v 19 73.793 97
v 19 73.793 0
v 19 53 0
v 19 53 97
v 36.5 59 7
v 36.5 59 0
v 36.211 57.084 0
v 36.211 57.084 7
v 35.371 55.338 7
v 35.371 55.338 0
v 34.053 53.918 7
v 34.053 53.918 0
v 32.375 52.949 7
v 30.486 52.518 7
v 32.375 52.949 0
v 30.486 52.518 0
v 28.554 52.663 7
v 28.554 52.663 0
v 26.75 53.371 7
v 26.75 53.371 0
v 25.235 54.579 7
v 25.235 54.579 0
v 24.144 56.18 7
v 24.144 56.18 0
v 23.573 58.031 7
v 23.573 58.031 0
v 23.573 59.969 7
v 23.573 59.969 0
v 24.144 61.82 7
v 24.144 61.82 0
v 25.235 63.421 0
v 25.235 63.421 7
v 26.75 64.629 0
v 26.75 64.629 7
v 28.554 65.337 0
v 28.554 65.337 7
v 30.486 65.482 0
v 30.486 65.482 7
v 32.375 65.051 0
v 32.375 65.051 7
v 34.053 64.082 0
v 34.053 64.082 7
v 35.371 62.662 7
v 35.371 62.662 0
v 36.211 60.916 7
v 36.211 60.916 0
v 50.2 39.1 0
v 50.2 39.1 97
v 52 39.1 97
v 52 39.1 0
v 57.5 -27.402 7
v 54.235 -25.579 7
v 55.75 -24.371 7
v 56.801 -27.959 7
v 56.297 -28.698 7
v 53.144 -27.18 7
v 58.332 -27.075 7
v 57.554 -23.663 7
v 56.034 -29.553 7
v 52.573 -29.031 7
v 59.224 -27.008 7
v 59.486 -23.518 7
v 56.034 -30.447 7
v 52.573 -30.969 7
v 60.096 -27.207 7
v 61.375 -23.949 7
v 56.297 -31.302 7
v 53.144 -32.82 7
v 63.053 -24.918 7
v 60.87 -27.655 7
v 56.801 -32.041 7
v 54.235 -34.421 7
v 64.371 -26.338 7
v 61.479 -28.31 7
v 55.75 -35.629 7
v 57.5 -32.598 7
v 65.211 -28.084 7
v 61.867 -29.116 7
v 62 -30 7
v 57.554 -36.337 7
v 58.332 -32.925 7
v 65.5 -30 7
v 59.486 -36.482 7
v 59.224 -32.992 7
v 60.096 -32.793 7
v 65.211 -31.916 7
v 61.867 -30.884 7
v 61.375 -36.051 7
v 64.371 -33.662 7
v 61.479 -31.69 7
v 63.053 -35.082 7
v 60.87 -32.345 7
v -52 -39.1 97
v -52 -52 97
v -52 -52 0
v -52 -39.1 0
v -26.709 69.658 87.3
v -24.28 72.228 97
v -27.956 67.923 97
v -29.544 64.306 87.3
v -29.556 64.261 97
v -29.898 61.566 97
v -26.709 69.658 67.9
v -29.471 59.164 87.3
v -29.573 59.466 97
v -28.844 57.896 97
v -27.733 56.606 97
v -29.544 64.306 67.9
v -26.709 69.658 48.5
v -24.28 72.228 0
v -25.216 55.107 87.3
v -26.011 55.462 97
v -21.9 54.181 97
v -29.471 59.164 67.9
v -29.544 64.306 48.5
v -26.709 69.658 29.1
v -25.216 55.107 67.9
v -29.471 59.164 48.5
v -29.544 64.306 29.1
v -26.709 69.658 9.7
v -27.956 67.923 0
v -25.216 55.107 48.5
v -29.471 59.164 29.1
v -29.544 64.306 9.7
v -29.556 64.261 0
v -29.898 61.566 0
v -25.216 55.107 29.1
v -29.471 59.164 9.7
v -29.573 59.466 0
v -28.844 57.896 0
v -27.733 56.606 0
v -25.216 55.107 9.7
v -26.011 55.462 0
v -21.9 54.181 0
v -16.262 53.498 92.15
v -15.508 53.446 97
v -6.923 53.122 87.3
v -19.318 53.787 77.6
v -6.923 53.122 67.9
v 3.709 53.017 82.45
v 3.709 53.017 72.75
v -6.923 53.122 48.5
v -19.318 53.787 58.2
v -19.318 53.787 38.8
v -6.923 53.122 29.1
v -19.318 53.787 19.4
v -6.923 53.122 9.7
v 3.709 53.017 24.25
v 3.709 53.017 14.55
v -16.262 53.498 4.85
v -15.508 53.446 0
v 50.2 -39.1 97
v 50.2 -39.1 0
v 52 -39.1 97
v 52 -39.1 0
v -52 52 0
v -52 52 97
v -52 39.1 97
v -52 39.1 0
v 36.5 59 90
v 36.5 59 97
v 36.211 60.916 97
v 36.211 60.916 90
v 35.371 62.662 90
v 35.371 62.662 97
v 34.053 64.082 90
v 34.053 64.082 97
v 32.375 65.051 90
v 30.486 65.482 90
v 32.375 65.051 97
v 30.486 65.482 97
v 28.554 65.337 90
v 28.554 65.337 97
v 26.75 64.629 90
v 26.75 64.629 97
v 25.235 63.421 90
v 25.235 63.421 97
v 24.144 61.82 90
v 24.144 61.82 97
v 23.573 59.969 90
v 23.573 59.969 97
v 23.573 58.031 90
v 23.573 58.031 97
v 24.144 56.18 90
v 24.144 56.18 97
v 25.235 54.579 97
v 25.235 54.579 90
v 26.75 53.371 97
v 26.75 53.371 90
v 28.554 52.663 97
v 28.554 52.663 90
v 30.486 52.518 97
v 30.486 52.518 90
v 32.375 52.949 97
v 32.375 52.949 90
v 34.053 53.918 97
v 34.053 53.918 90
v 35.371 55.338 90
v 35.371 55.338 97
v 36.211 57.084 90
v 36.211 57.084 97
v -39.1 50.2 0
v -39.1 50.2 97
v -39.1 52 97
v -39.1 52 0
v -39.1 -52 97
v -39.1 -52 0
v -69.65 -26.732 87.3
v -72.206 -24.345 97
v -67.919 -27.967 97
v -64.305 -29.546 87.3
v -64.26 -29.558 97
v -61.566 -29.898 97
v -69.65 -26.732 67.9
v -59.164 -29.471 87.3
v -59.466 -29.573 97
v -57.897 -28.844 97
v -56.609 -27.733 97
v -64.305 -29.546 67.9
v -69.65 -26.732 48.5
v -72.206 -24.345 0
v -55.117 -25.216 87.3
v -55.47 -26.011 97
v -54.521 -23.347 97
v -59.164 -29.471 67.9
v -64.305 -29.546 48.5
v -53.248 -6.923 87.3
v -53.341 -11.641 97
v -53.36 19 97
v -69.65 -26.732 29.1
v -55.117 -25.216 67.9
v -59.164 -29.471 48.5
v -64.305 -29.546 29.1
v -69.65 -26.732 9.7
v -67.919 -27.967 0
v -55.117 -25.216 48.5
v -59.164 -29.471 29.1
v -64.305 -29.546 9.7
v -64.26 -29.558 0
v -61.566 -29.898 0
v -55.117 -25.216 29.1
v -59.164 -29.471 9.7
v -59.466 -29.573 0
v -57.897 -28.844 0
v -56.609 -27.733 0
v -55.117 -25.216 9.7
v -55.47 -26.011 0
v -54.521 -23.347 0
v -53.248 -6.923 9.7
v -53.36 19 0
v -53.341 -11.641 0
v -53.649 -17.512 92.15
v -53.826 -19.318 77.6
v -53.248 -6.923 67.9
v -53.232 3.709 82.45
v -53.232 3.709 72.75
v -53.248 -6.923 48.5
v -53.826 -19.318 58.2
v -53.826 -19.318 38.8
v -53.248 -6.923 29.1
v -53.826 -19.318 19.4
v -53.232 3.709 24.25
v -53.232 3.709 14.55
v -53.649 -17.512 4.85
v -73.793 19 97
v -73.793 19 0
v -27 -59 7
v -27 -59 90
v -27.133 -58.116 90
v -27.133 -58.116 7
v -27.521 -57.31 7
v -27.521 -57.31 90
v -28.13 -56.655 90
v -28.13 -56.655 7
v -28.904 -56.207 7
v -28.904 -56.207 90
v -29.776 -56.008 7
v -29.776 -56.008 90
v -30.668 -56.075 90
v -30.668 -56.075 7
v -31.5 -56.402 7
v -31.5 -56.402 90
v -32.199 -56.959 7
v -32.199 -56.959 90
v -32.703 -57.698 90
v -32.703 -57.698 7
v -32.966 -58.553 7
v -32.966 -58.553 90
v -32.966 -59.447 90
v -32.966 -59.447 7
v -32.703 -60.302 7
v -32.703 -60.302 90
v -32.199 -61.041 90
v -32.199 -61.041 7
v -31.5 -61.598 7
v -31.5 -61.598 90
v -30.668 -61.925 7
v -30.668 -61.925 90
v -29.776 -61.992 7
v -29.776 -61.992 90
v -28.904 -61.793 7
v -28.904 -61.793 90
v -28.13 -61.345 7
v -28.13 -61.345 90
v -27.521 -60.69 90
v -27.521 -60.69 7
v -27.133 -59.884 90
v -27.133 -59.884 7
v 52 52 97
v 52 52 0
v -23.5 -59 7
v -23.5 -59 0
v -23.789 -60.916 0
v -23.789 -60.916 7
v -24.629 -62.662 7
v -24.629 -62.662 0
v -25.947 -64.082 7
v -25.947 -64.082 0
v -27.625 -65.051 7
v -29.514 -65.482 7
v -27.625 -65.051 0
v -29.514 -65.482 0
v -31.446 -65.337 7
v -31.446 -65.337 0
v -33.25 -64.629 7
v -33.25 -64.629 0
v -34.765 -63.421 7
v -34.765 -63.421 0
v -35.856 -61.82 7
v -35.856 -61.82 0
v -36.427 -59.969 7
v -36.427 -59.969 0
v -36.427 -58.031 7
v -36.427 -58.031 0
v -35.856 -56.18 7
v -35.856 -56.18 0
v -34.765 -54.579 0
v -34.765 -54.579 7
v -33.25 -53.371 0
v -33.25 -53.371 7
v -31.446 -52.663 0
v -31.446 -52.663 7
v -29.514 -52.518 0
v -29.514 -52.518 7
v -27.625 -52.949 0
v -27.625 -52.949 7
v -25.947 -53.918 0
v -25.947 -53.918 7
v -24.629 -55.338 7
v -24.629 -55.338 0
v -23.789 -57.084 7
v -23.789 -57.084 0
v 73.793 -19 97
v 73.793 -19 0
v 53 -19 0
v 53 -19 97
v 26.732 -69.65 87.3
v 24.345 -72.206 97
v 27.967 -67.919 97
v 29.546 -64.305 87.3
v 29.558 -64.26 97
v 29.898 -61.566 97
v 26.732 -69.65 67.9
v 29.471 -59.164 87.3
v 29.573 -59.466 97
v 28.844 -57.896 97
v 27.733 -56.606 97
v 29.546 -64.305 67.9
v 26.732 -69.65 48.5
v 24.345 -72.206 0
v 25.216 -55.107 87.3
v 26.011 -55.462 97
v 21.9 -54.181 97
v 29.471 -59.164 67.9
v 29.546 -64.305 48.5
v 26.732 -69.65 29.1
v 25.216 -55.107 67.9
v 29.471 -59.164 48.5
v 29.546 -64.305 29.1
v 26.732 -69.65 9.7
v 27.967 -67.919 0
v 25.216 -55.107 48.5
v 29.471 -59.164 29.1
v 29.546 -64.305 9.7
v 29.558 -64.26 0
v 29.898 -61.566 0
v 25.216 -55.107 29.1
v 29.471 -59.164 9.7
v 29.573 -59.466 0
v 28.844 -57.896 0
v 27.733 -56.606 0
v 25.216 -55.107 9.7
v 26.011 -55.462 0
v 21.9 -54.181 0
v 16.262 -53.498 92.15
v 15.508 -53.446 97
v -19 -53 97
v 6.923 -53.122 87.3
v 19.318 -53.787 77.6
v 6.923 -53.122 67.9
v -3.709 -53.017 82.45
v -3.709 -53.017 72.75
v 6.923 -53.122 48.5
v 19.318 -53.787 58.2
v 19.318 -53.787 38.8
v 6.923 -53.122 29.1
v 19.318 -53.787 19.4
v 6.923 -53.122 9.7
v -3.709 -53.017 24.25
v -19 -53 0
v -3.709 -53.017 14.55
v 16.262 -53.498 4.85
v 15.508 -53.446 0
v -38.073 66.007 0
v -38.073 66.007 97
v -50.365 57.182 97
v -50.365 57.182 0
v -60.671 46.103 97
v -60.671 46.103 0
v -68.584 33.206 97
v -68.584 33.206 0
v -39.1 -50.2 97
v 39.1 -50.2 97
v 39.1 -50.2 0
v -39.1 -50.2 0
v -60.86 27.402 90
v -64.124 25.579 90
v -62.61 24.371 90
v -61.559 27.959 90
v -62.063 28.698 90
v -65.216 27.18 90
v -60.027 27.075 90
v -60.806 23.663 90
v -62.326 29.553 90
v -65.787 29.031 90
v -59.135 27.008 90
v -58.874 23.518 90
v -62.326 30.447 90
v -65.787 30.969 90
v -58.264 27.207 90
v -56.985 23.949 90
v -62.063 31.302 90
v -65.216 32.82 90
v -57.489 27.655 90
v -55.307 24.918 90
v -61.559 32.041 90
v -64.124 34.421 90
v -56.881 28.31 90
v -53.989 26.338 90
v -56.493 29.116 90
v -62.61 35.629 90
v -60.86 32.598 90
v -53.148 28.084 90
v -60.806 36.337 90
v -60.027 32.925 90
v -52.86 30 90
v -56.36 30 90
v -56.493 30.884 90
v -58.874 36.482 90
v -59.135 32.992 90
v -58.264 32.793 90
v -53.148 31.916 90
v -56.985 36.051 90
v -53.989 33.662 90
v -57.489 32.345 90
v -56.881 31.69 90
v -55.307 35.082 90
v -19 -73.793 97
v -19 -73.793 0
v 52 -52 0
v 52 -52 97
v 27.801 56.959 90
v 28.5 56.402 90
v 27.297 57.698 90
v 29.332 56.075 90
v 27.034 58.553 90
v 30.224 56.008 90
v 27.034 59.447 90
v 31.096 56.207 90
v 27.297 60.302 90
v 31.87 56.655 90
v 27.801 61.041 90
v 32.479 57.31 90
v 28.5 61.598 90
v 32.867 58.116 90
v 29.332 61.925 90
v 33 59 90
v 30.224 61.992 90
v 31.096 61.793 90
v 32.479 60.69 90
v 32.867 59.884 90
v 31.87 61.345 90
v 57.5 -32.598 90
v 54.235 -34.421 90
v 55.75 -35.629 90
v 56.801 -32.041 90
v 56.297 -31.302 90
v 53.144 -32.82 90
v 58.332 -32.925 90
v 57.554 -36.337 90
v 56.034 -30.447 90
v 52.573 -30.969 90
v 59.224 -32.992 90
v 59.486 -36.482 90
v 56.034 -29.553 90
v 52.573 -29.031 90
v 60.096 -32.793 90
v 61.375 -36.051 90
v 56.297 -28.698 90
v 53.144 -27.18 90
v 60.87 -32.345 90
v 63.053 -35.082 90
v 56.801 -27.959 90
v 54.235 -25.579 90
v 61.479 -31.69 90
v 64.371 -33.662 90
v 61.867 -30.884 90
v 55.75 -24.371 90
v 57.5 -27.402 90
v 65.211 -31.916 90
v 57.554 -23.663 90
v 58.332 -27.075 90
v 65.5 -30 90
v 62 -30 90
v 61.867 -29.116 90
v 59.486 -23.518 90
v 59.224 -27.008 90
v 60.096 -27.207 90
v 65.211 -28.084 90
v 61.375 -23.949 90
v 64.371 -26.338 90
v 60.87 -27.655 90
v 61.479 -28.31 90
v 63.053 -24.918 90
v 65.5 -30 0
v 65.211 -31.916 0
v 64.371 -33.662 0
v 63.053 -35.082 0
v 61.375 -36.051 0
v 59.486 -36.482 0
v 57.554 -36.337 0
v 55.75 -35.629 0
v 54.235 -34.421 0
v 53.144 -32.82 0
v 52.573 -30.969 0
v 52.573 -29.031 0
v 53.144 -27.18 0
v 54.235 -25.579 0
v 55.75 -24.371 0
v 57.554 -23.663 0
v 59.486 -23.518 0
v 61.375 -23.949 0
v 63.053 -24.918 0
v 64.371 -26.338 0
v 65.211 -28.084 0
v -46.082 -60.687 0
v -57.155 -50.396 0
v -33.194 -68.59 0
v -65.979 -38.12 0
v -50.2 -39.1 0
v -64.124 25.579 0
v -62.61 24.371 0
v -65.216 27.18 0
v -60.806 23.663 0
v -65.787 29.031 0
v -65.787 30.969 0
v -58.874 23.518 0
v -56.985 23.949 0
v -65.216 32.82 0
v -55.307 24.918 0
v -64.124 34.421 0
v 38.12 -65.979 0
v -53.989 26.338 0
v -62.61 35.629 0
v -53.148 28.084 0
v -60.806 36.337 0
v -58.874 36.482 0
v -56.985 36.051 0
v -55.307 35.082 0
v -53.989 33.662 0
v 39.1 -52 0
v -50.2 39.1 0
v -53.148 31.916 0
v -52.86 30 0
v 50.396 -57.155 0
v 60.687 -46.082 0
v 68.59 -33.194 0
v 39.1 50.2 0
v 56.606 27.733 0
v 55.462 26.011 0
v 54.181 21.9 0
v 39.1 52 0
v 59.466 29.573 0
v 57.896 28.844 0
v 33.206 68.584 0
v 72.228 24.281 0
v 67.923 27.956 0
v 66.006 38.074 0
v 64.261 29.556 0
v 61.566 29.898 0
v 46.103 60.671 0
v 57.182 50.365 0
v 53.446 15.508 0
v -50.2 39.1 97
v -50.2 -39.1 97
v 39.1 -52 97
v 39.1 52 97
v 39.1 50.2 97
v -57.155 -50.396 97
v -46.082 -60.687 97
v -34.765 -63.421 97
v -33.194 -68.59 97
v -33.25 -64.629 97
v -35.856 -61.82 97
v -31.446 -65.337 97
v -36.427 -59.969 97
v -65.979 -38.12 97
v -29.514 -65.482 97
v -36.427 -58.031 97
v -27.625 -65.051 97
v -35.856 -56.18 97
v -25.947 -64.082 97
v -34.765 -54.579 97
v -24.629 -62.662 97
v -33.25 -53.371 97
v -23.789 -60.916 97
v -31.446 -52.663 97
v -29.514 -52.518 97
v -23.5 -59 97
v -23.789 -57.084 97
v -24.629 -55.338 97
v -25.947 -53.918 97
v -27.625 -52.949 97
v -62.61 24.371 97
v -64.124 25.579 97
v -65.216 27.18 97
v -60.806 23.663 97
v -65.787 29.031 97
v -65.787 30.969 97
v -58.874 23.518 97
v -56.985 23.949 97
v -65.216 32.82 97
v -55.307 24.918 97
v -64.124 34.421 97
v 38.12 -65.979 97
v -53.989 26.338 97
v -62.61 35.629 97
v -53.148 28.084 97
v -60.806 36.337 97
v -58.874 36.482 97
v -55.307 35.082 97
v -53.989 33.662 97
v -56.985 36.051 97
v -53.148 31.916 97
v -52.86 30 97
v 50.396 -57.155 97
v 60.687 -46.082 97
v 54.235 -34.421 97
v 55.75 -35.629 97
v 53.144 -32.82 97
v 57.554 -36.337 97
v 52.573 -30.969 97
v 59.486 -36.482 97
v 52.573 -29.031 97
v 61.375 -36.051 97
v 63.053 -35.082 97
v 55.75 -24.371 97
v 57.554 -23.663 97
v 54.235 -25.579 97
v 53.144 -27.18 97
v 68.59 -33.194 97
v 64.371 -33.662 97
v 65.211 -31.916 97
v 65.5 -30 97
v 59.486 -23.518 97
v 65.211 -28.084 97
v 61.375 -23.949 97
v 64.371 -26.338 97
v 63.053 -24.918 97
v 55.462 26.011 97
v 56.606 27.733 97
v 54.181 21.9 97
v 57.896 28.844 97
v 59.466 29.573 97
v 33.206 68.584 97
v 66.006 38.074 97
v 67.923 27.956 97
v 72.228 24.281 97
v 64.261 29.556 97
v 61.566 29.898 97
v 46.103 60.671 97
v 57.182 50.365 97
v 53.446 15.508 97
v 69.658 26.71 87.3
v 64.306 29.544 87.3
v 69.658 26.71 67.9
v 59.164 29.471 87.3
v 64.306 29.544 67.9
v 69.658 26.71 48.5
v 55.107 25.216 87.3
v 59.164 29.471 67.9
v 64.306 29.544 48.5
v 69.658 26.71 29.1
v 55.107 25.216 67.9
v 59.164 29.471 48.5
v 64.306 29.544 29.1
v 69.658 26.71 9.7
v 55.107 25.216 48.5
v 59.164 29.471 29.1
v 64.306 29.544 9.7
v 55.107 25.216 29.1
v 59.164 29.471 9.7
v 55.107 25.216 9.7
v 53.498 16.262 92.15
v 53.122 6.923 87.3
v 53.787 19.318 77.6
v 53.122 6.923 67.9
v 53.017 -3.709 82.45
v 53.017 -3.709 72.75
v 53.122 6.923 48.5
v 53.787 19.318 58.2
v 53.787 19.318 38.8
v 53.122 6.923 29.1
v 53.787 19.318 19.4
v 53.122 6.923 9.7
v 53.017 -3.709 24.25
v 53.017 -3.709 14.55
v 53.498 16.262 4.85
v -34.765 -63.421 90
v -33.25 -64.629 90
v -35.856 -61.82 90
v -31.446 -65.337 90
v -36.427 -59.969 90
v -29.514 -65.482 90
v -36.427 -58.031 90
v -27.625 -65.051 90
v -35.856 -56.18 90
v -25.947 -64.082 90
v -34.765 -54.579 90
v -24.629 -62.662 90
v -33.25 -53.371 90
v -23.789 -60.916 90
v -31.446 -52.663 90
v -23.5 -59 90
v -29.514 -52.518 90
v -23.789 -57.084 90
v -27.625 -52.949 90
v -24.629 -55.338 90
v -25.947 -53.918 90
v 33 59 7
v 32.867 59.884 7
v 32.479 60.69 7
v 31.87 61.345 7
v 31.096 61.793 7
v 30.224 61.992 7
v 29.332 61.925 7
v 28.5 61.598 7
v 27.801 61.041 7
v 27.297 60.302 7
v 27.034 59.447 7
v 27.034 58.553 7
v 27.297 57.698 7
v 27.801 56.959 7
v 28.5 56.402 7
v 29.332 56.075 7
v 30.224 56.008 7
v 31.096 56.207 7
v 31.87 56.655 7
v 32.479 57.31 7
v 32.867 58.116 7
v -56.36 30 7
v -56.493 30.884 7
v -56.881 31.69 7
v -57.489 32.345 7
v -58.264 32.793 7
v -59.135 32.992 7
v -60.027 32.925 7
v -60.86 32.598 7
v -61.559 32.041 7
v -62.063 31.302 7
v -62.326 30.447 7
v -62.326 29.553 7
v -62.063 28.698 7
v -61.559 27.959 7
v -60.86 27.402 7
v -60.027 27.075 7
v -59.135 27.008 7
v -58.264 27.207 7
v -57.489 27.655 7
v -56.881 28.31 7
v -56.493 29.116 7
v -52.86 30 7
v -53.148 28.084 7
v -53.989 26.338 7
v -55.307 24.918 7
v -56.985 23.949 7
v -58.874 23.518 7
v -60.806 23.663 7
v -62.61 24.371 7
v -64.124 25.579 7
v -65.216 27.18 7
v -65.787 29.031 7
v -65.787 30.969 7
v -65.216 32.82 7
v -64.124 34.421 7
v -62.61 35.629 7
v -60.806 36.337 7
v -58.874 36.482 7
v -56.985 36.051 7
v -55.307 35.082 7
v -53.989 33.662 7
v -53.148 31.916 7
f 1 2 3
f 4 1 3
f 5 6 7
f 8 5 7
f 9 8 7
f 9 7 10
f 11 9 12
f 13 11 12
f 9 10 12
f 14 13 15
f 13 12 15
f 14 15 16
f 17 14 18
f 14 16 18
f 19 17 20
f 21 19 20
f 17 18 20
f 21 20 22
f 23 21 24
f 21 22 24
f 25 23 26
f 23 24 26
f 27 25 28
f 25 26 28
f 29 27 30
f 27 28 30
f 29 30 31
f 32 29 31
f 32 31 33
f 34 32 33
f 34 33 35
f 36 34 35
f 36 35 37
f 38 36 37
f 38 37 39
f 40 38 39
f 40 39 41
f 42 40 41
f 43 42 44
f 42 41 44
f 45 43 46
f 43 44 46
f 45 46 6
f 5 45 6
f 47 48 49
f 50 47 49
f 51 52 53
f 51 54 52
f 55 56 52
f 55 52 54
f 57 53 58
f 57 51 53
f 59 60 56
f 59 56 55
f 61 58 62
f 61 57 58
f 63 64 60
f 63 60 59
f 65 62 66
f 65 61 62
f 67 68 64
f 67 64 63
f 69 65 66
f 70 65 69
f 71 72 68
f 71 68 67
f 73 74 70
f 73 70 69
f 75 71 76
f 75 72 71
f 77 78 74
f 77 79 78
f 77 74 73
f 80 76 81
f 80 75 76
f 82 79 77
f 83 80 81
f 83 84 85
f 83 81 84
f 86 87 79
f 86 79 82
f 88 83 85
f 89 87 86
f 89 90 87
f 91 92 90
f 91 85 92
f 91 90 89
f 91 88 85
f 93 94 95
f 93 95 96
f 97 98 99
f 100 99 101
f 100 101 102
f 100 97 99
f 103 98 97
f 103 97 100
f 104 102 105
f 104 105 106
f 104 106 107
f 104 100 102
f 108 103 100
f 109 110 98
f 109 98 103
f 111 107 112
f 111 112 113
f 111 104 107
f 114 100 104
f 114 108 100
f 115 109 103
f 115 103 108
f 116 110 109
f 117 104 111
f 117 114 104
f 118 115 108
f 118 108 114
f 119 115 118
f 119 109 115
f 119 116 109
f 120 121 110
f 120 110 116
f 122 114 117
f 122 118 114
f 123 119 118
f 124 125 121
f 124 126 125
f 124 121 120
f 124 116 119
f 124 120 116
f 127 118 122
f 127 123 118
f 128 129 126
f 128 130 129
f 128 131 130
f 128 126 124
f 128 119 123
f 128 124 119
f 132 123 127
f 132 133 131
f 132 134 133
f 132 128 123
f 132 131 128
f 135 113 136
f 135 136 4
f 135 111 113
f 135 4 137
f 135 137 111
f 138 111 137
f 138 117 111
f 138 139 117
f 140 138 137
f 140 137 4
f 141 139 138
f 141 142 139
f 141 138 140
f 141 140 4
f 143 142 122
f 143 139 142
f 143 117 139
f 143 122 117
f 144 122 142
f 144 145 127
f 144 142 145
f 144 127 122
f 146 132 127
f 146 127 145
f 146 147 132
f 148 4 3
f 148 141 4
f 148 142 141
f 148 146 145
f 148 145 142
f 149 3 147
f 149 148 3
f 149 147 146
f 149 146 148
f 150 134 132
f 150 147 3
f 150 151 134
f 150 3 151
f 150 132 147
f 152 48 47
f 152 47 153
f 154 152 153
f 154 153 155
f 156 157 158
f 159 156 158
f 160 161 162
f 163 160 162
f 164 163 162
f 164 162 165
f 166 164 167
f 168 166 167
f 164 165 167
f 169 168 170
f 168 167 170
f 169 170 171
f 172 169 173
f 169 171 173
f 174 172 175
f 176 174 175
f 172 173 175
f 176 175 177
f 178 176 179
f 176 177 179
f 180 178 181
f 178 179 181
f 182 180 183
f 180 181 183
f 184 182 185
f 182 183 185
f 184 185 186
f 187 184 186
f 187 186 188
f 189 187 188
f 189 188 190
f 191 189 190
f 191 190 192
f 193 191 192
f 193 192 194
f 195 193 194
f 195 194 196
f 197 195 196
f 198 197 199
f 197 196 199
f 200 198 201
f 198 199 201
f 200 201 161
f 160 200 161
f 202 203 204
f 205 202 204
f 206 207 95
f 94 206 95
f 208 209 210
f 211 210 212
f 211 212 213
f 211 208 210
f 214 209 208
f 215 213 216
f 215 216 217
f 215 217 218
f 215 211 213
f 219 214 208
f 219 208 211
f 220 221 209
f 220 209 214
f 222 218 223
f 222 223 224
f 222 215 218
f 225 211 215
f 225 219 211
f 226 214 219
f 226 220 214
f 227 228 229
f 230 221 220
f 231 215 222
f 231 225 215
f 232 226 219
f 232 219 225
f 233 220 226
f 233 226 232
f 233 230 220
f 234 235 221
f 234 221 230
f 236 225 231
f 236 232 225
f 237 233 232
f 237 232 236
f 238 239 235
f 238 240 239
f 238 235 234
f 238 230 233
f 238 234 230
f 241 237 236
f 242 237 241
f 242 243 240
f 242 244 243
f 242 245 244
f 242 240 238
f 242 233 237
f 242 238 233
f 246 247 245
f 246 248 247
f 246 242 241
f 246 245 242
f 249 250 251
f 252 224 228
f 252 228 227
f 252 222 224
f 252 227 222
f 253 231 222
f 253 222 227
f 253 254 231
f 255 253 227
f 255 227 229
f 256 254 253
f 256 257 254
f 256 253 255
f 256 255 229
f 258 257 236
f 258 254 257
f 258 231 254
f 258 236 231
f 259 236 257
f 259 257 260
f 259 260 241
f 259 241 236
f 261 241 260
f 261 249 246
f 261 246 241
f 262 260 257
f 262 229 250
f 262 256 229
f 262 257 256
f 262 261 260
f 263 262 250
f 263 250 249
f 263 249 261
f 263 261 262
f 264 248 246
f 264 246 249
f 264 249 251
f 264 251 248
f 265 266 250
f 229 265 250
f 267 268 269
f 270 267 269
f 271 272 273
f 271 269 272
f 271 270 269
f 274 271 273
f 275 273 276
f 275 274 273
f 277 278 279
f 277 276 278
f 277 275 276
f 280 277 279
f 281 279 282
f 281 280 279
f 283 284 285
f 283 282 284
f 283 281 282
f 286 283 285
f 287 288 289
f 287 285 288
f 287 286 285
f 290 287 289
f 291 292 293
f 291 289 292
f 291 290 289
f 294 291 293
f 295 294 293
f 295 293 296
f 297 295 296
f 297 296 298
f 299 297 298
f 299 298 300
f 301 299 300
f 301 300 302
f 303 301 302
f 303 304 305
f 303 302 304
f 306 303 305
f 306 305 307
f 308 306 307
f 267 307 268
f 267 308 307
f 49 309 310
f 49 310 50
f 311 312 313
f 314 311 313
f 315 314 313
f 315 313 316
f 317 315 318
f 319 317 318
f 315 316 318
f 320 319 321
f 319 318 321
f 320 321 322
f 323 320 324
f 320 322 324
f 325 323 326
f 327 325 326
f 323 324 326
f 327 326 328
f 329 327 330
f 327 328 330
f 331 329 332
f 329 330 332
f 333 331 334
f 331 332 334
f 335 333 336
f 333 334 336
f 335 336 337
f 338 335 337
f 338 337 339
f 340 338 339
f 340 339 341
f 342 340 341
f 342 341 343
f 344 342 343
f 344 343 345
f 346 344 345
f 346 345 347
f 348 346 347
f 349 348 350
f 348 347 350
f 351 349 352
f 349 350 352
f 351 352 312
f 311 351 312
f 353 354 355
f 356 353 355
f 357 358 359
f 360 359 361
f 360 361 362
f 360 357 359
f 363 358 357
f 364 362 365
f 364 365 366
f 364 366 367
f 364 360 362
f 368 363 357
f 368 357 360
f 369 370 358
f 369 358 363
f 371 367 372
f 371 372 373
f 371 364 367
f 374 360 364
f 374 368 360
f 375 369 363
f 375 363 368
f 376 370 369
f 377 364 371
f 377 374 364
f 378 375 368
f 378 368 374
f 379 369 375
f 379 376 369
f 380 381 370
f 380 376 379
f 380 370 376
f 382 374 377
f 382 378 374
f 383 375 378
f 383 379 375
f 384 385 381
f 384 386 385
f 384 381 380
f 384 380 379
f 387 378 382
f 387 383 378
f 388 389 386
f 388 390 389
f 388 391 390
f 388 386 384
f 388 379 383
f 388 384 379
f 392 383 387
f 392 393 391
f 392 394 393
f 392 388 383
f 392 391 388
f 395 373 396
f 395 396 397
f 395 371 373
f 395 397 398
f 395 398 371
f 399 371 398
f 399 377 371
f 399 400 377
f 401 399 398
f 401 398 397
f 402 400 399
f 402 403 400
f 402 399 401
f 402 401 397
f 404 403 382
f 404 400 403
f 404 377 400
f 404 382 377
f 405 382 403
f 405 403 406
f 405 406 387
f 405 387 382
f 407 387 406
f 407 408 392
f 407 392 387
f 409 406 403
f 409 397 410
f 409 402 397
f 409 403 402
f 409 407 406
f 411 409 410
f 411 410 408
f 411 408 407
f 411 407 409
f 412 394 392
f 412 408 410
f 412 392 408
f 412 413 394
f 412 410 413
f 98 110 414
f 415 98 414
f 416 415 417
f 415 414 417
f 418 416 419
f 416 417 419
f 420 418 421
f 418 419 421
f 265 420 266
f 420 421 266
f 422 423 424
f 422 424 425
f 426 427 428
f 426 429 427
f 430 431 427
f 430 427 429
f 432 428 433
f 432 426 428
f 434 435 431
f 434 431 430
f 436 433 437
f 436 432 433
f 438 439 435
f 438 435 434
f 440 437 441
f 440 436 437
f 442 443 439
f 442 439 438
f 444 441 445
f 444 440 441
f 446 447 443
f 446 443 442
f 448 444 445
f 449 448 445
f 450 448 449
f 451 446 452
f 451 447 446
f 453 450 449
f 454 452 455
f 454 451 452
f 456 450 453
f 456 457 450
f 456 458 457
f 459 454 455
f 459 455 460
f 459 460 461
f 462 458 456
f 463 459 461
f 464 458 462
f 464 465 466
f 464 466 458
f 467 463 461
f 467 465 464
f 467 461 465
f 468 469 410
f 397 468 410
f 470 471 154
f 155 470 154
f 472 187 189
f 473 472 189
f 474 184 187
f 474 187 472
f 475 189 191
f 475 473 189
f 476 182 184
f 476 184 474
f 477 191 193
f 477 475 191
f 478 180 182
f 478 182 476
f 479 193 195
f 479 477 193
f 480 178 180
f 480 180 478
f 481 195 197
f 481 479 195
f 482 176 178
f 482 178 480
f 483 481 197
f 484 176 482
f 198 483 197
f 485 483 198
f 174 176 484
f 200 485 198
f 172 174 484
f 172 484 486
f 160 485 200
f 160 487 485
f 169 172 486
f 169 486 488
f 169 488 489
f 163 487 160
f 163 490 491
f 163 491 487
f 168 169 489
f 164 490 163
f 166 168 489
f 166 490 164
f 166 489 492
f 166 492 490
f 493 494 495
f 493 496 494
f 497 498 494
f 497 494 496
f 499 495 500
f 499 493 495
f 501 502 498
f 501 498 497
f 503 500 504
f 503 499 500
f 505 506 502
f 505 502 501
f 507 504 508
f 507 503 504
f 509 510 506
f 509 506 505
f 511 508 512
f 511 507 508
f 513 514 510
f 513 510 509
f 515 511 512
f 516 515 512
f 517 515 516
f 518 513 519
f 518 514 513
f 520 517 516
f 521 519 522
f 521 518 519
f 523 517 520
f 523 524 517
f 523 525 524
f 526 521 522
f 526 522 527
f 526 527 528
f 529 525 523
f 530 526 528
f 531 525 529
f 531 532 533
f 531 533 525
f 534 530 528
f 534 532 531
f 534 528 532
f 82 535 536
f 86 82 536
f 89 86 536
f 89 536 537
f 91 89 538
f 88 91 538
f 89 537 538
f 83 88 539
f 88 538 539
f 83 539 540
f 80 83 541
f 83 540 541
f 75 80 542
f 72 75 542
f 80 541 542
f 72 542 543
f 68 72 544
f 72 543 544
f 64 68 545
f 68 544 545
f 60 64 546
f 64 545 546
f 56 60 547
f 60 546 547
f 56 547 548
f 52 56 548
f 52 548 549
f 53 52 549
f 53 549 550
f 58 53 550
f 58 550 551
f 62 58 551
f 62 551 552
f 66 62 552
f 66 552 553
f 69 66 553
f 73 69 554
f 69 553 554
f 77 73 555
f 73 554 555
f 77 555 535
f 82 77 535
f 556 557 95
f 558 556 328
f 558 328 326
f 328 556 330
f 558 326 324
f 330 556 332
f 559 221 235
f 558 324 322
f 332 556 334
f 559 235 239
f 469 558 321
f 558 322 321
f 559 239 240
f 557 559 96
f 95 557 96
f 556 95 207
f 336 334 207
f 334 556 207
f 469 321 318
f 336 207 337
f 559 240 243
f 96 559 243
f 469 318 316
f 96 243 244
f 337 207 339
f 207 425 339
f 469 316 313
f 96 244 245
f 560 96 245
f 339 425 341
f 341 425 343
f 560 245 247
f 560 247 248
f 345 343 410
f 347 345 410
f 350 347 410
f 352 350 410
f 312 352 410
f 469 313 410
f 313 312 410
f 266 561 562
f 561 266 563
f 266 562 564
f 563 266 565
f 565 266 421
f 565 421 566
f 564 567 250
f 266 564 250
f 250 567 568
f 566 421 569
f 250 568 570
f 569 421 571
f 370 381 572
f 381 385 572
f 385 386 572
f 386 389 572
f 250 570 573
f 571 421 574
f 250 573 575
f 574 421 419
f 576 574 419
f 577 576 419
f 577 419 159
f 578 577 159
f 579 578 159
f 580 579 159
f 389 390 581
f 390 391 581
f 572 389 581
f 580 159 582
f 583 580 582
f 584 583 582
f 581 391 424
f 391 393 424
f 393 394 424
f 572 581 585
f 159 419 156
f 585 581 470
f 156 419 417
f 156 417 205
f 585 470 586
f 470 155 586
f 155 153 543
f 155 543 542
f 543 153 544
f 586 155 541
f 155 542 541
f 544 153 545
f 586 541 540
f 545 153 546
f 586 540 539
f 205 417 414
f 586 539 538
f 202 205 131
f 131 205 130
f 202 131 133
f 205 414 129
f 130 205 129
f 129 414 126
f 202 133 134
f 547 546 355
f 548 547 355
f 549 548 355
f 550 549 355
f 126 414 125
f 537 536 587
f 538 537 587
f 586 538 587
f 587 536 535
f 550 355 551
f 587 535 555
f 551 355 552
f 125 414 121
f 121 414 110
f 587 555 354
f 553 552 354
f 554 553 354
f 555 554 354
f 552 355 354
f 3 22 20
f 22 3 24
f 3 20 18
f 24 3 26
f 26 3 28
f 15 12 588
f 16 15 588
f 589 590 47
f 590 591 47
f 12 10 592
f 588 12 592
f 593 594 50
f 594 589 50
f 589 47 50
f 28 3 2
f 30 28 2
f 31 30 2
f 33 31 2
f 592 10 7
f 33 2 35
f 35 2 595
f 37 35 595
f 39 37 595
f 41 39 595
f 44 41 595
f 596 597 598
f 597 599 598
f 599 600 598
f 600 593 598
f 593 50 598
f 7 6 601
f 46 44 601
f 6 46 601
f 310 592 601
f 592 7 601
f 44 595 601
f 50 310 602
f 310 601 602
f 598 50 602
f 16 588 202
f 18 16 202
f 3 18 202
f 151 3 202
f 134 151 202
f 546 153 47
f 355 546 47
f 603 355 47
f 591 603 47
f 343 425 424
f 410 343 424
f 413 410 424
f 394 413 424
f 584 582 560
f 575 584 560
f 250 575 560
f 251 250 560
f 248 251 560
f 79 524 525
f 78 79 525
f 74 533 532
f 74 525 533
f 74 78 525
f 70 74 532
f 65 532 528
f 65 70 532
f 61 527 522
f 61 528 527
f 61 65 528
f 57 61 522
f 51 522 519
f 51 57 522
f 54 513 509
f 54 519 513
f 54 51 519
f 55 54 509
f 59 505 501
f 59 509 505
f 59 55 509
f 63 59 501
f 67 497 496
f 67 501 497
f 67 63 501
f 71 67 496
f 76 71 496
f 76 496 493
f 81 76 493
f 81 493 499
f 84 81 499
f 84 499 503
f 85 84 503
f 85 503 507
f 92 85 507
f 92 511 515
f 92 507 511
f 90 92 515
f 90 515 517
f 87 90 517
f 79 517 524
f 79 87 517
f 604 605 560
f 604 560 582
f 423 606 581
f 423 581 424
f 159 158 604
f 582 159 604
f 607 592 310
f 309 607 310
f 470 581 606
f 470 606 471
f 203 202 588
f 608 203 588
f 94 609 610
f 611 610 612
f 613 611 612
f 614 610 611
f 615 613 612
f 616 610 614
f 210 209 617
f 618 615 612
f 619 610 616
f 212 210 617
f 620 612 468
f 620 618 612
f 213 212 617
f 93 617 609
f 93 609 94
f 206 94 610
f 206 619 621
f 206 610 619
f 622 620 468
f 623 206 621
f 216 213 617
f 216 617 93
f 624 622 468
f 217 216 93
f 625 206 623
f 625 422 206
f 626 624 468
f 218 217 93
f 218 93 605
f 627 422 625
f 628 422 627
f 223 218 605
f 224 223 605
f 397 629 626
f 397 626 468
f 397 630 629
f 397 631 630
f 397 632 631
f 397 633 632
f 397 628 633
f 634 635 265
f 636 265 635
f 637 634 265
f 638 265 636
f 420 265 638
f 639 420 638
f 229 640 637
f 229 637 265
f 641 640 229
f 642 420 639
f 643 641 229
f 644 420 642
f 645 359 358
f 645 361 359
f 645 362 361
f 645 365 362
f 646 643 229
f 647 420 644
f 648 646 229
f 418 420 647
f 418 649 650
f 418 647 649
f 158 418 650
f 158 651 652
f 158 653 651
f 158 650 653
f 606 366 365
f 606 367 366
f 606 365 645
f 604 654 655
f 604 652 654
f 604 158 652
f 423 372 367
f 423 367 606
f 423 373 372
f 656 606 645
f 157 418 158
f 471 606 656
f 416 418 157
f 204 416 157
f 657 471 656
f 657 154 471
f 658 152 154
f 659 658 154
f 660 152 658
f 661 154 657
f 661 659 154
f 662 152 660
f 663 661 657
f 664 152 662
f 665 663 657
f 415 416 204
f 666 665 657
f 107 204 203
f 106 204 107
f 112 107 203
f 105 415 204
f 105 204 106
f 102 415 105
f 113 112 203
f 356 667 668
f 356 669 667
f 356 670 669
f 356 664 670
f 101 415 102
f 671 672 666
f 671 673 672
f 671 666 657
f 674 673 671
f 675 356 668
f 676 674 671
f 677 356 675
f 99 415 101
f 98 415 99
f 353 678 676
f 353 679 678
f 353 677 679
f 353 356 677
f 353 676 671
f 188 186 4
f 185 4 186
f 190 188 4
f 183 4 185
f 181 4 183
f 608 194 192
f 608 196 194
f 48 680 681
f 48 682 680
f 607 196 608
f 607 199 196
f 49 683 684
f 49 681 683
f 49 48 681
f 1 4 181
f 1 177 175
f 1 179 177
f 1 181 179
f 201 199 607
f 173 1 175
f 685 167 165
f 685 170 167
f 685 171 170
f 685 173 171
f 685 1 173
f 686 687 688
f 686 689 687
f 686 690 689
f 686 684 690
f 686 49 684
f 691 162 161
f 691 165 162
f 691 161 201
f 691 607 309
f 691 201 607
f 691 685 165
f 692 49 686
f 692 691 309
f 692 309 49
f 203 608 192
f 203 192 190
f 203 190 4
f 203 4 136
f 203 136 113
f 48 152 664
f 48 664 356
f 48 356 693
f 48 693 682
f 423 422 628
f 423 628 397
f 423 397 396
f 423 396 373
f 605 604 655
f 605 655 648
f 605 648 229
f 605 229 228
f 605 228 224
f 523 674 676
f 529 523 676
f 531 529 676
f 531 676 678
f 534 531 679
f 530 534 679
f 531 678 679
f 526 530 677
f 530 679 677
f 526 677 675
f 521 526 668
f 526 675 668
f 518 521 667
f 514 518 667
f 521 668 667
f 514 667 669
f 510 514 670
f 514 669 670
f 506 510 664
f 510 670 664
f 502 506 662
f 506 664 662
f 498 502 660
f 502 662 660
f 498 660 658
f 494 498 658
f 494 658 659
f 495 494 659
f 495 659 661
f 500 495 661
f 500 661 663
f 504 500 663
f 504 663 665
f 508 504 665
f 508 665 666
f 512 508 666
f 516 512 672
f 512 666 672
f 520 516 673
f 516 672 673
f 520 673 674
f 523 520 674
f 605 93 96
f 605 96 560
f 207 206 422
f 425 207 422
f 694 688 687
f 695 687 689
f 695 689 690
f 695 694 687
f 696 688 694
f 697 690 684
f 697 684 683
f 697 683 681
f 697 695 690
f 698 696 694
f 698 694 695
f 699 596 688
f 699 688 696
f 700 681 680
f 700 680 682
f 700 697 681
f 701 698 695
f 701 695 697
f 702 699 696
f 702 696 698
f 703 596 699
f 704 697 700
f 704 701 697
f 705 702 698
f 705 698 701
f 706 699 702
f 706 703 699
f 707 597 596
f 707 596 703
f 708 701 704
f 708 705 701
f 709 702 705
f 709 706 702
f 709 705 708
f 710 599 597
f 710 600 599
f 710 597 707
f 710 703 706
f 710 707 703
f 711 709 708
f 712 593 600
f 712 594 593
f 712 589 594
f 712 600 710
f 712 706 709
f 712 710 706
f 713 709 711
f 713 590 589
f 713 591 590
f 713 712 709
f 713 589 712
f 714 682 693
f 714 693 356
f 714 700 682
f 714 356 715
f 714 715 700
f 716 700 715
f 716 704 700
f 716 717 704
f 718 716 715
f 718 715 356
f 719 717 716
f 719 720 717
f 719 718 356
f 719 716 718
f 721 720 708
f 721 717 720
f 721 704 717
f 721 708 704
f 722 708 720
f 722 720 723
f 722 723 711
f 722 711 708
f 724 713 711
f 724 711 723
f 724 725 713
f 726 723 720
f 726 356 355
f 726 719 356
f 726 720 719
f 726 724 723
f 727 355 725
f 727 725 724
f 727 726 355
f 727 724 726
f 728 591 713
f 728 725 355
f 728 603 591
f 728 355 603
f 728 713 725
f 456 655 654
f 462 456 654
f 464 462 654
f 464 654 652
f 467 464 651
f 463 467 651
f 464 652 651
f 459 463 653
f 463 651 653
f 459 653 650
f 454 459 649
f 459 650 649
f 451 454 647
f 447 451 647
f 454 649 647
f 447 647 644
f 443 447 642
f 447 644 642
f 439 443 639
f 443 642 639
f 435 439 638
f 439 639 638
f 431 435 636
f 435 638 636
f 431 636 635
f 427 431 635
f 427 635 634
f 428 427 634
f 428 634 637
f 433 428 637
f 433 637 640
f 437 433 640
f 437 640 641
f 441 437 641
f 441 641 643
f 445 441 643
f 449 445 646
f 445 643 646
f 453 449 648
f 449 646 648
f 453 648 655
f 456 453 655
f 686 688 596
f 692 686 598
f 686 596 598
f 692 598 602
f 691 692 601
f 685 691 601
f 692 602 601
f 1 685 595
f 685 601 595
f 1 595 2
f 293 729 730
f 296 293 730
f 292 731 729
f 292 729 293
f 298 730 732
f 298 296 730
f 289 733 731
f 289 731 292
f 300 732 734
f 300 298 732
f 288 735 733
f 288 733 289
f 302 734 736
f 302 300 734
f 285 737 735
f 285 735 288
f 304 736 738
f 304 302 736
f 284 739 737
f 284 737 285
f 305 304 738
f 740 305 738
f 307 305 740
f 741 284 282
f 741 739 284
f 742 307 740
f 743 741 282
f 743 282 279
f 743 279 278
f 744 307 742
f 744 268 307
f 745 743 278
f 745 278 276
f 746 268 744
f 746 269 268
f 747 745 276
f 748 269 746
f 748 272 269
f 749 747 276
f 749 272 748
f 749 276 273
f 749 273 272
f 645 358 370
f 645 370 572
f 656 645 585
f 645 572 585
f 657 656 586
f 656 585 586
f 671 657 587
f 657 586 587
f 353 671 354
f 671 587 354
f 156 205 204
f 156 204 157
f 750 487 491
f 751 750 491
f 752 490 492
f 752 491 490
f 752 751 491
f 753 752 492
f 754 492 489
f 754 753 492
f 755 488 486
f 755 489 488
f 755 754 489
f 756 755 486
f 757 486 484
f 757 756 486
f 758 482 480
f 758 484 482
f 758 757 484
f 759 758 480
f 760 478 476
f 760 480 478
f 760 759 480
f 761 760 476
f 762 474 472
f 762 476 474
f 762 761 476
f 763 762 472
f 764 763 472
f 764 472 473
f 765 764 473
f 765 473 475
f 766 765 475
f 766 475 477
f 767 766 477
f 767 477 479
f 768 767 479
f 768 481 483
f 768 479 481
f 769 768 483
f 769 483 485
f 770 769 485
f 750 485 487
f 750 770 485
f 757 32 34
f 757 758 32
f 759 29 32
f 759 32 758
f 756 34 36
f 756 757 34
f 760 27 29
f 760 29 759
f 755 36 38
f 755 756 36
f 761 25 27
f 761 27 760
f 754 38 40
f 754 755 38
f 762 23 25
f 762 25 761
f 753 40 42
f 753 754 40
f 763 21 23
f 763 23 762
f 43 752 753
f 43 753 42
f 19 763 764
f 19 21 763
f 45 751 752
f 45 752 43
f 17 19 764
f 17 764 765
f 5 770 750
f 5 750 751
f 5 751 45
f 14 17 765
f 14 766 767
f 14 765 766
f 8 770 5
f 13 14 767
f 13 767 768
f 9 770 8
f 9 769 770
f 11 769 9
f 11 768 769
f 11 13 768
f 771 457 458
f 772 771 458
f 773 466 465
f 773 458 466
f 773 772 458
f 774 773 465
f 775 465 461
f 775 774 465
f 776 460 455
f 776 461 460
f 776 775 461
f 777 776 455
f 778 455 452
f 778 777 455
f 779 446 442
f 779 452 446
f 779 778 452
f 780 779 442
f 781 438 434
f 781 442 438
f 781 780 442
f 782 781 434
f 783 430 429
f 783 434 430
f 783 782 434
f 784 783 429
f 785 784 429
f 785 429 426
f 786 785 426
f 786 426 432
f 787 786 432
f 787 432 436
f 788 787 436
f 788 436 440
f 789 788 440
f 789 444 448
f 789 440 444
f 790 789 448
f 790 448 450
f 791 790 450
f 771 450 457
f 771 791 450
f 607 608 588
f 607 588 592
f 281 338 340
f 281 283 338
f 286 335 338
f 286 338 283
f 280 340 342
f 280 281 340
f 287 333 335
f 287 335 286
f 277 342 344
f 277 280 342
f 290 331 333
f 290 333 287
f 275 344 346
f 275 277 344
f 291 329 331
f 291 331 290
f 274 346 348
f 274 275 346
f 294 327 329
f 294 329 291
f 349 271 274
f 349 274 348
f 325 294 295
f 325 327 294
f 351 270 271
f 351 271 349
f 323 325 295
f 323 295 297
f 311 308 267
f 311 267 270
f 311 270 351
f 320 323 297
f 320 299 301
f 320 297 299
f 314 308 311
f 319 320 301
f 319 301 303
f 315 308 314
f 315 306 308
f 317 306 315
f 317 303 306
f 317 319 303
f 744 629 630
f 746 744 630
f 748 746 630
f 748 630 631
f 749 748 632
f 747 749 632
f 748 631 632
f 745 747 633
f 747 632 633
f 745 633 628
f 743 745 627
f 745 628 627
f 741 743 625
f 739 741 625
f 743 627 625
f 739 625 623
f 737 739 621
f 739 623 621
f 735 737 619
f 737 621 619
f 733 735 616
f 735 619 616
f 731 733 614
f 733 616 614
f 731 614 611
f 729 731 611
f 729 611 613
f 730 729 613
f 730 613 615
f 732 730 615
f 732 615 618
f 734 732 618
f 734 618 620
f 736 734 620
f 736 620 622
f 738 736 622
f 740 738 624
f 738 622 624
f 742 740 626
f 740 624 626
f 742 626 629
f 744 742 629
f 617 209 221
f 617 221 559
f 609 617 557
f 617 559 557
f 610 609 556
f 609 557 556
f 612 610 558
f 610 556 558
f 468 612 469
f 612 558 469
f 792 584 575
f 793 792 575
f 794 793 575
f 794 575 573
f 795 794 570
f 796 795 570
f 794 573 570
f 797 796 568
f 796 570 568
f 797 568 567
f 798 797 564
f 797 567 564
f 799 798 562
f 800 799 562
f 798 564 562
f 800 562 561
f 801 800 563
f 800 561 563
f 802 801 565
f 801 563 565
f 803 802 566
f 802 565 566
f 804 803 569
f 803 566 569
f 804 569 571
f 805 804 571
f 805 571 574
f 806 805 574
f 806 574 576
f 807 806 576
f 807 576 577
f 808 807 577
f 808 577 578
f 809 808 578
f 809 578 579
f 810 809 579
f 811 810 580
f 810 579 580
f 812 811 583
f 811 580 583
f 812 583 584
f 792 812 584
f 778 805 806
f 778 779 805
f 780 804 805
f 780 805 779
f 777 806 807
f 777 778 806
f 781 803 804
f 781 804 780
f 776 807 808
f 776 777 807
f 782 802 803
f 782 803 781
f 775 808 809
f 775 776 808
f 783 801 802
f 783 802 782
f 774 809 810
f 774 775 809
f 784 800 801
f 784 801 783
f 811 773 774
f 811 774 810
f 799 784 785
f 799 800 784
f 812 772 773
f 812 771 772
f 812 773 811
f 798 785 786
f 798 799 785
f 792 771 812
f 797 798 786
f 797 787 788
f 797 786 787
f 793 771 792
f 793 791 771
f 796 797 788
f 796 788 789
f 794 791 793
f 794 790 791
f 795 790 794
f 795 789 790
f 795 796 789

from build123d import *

# Parameters (mm, degrees)
BOSS_EXTRUDE3_OUTLINE_R = 3
BOSS_EXTRUDE3_DEPTH     = 97
SKETCH3_R               = 3
BOSS_EXTRUDE4_DEPTH     = 5
SKETCH3_3_R             = 6.5
CUT_EXTRUDE1_DEPTH      = 7
BOSS_EXTRUDE5_OUTLINE_R = 3
BOSS_EXTRUDE5_DEPTH     = 6
CUT_EXTRUDE2_DEPTH      = 6
SKETCH6_R               = 6.5
CUT_EXTRUDE5_DEPTH      = 7
CUT_EXTRUDE6_DEPTH      = 97
CUT_EXTRUDE9_DEPTH      = 97
SKETCH9_W               = 0.4
SKETCH9_H               = 1.8
SKETCH9_W_2             = 1.8
SKETCH9_H_2             = 0.4
BOSS_EXTRUDE6_DEPTH     = 97


# Read off the part's stored shape, not the designer's step: Boss-Extrude3, Boss-Extrude5, Cut-Extrude2
with BuildPart() as part:
    # Boss-Extrude3 outline → Boss-Extrude3 (new body)
    with BuildSketch(Plane.XY):
        with BuildLine():
            ThreePointArc((-24.28, 72.228260397), (-55.793380191, 51.899313356), (-73.793224621, 19))
            Line((-73.793224621, 19), (-53.359615493, 19))
            add(Edge.make_bspline(
                [(-72.206415586, -24.344887517), (-69.541086329, -27.040667073), (-67.428574969, -29.089162938), (-64.355831171, -30.241441862), (-60.963009895, -31.073643307), (-59.042545022, -30.561519341), (-56.673971678, -29.217193929), (-54.241382838, -27.488775543), (-53, -25.105954954), (-53, -17.37432721), (-53.359615493, 19)],
                knots=[0, 0, 0, 0, 0, 0, 0, 0, 0, 0, 0, 1, 1, 1, 1, 1, 1, 1, 1, 1, 1, 1], degree=10))
            ThreePointArc((-72.206415586, -24.344887517), (-51.874242853, -55.816690411), (-19, -73.793224621))
            Line((-19, -73.793224621), (-19, -53))
            add(Edge.make_bspline(
                [(24.344887517, -72.206415586), (27.040667073, -69.541086329), (29.089162938, -67.428574969), (30.241441862, -64.355831171), (31.073643307, -60.963009895), (30.561519341, -59.042545022), (29.217193929, -56.673971678), (27.488775543, -54.241382838), (25.105954954, -53), (17.37432721, -53), (-19, -53)],
                knots=[0, 0, 0, 0, 0, 0, 0, 0, 0, 0, 0, 1, 1, 1, 1, 1, 1, 1, 1, 1, 1, 1], degree=10))
            ThreePointArc((24.344887517, -72.206415586), (55.816690411, -51.874242853), (73.793224621, -19))
            Line((73.793224621, -19), (53, -19))
            add(Edge.make_bspline(
                [(72.227927536, 24.280990174), (69.541086329, 27.040667073), (67.428574969, 29.089162938), (64.355831171, 30.241441862), (60.963009895, 31.073643307), (59.042545022, 30.561519341), (56.673971678, 29.217193929), (54.241382838, 27.488775543), (53, 25.105954954), (53, 17.37432721), (53, -19)],
                knots=[0, 0, 0, 0, 0, 0, 0, 0, 0, 0, 0, 1, 1, 1, 1, 1, 1, 1, 1, 1, 1, 1], degree=10))
            ThreePointArc((72.227927536, 24.280990174), (51.89893092, 55.793735933), (19, 73.793224621))
            Line((19, 73.793224621), (19, 53))
            add(Edge.make_bspline(
                [(-24.28, 72.228260397), (-27.040667073, 69.541086329), (-29.089162938, 67.428574969), (-30.241441862, 64.355831171), (-31.073643307, 60.963009895), (-30.561519341, 59.042545022), (-29.217193929, 56.673971678), (-27.488775543, 54.241382838), (-25.105954954, 53), (-17.37432721, 53), (19, 53)],
                knots=[0, 0, 0, 0, 0, 0, 0, 0, 0, 0, 0, 1, 1, 1, 1, 1, 1, 1, 1, 1, 1, 1], degree=10))
        make_face()
        with Locations((-30, -59)):
            Circle(BOSS_EXTRUDE3_OUTLINE_R, mode=Mode.SUBTRACT)
        Polygon((-38.9, -51.6), (-51.6, -51.6), (-51.6, -38.9), (-50, -38.9), (-50, 38.9), (-51.6, 38.9), (-51.6, 51.6), (-38.9, 51.6), (-38.9, 50), (38.9, 50), (38.9, 51.6), (51.6, 51.6), (51.6, 38.9), (50, 38.9), (50, -38.9), (51.6, -38.9), (51.6, -51.6), (38.9, -51.6), (38.9, -50), (-38.9, -50), align=None, mode=Mode.SUBTRACT)
        with Locations((59, -30)):
            Circle(BOSS_EXTRUDE3_OUTLINE_R, mode=Mode.SUBTRACT)
        with Locations((-59.359615493, 30)):
            Circle(BOSS_EXTRUDE3_OUTLINE_R, mode=Mode.SUBTRACT)
        with Locations((30, 59)):
            Circle(BOSS_EXTRUDE3_OUTLINE_R, mode=Mode.SUBTRACT)
    extrude(amount=BOSS_EXTRUDE3_DEPTH)

    # Sketch3 → Boss-Extrude4 (add)
    with BuildSketch(Plane.XY.offset(97)):
        with Locations(Location((-59.359615493, 30, 0), (0, 0, 180))):
            Circle(SKETCH3_R)
    extrude(amount=BOSS_EXTRUDE4_DEPTH)


with BuildPart() as boss_extrude4_kept_piece:
    # of the separate pieces the step leaves, the one the design keeps (boss_extrude4_pieces_kept)
    add(part.part.solids().sort_by_distance((-24.28, 72.228260397, 0))[0])

    # Sketch3<3> → Cut-Extrude1 (cut)
    with BuildSketch(Plane.XY.offset(97)):
        with Locations((-59.359615493, 30)):
            Circle(SKETCH3_3_R)
        with Locations((30, 59)):
            Circle(SKETCH3_3_R)
        with Locations((59, -30)):
            Circle(SKETCH3_3_R)
        with Locations((-30, -59)):
            Circle(SKETCH3_3_R)
    extrude(amount=-CUT_EXTRUDE1_DEPTH, mode=Mode.SUBTRACT)

    # Boss-Extrude5 outline → Boss-Extrude5 (add)
    with BuildSketch(Plane.XY):
        with Locations((-59.359615493, 30)):
            Circle(BOSS_EXTRUDE5_OUTLINE_R)
    extrude(amount=BOSS_EXTRUDE5_DEPTH)

    # Cut-Extrude2 outline → Cut-Extrude2 (cut)
    with BuildSketch(Plane.XY):
        Polygon((-32.75, -54.236860279), (-35.5, -59), (-32.75, -63.763139721), (-27.25, -63.763139721), (-24.5, -59), (-27.25, -54.236860279), align=None)
        Polygon((59, -24.5), (54.236860279, -27.25), (54.236860279, -32.75), (59, -35.5), (63.763139721, -32.75), (63.763139721, -27.25), align=None)
        Polygon((-59.359615493, 35.5), (-64.122755214, 32.75), (-64.122755214, 27.25), (-59.359615493, 24.5), (-54.596475772, 27.25), (-54.596475772, 32.75), align=None)
        Polygon((32.75, 63.763139721), (27.25, 63.763139721), (24.5, 59), (27.25, 54.236860279), (32.75, 54.236860279), (35.5, 59), align=None)
    extrude(amount=CUT_EXTRUDE2_DEPTH, mode=Mode.SUBTRACT)

    # Sketch6 → Cut-Extrude5 (cut)
    with BuildSketch(Plane(origin=(0, 0, 0), x_dir=(-1, 0, 0), z_dir=(0, 0, -1))):
        with Locations(Location((-30, 59, 0), (0, 0, 180))):
            Circle(SKETCH6_R)
        with Locations(Location((59.359615493, 30, 0), (0, 0, 180))):
            Circle(SKETCH6_R)
        with Locations(Location((30, -59, 0), (0, 0, 180))):
            Circle(SKETCH6_R)
        with Locations(Location((-59, -30, 0), (0, 0, 180))):
            Circle(SKETCH6_R)
    extrude(amount=-CUT_EXTRUDE5_DEPTH, mode=Mode.SUBTRACT)

    # Sketch7 → Cut-Extrude6 (cut)
    with BuildSketch(Plane.XY.offset(97)):
        Polygon((-38.7, -51.8), (-51.8, -51.8), (-51.8, -38.7), (-50.2, -38.7), (-50.2, 38.7), (-51.8, 38.7), (-51.8, 51.8), (-38.7, 51.8), (-38.7, 50.2), (38.7, 50.2), (38.7, 51.8), (51.8, 51.8), (51.8, 38.7), (50.2, 38.7), (50.2, -38.7), (51.8, -38.7), (51.8, -51.8), (38.7, -51.8), (38.7, -50.2), (-38.7, -50.2), align=None)
        Polygon((-38.9, -51.6), (-51.6, -51.6), (-51.6, -38.9), (-50, -38.9), (-50, 38.9), (-51.6, 38.9), (-51.6, 51.6), (-38.9, 51.6), (-38.9, 50), (38.9, 50), (38.9, 51.6), (51.6, 51.6), (51.6, 38.9), (50, 38.9), (50, -38.9), (51.6, -38.9), (51.6, -51.6), (38.9, -51.6), (38.9, -50), (-38.9, -50), align=None, mode=Mode.SUBTRACT)
    extrude(amount=-CUT_EXTRUDE6_DEPTH, mode=Mode.SUBTRACT)

    # Sketch8 → Cut-Extrude9 (cut)
    with BuildSketch(Plane.XY.offset(97)):
        Polygon((-51.8, 38.7), (-51.8, 51.8), (-38.7, 51.8), (-38.7, 52), (-52, 52), (-52, 38.7), align=None)
        Polygon((-51.8, -38.7), (-51.8, -51.8), (-38.7, -51.8), (-38.7, -52), (-52, -52), (-52, -38.7), align=None)
        Polygon((51.8, -38.7), (51.8, -51.8), (38.7, -51.8), (38.7, -52), (52, -52), (52, -38.7), align=None)
        Polygon((51.8, 38.7), (51.8, 51.8), (38.7, 51.8), (38.7, 52), (52, 52), (52, 38.7), align=None)
    extrude(amount=-CUT_EXTRUDE9_DEPTH, mode=Mode.SUBTRACT)

    # Sketch9 → Boss-Extrude6 (add)
    with BuildSketch(Plane.XY.offset(97)):
        with Locations((-38.9, 51.1)):
            Rectangle(SKETCH9_W, SKETCH9_H)
        with Locations((-51.1, 38.9)):
            Rectangle(SKETCH9_W_2, SKETCH9_H_2)
        with Locations((38.9, 51.1)):
            Rectangle(SKETCH9_W, SKETCH9_H)
        with Locations((51.1, 38.9)):
            Rectangle(SKETCH9_W_2, SKETCH9_H_2)
        with Locations((51.1, -38.9)):
            Rectangle(SKETCH9_W_2, SKETCH9_H_2)
        with Locations((38.9, -51.1)):
            Rectangle(SKETCH9_W, SKETCH9_H)
        with Locations((-51.1, -38.9)):
            Rectangle(SKETCH9_W_2, SKETCH9_H_2)
        with Locations((-38.9, -51.1)):
            Rectangle(SKETCH9_W, SKETCH9_H)
    extrude(amount=-BOSS_EXTRUDE6_DEPTH)


solid = boss_extrude4_kept_piece.part
